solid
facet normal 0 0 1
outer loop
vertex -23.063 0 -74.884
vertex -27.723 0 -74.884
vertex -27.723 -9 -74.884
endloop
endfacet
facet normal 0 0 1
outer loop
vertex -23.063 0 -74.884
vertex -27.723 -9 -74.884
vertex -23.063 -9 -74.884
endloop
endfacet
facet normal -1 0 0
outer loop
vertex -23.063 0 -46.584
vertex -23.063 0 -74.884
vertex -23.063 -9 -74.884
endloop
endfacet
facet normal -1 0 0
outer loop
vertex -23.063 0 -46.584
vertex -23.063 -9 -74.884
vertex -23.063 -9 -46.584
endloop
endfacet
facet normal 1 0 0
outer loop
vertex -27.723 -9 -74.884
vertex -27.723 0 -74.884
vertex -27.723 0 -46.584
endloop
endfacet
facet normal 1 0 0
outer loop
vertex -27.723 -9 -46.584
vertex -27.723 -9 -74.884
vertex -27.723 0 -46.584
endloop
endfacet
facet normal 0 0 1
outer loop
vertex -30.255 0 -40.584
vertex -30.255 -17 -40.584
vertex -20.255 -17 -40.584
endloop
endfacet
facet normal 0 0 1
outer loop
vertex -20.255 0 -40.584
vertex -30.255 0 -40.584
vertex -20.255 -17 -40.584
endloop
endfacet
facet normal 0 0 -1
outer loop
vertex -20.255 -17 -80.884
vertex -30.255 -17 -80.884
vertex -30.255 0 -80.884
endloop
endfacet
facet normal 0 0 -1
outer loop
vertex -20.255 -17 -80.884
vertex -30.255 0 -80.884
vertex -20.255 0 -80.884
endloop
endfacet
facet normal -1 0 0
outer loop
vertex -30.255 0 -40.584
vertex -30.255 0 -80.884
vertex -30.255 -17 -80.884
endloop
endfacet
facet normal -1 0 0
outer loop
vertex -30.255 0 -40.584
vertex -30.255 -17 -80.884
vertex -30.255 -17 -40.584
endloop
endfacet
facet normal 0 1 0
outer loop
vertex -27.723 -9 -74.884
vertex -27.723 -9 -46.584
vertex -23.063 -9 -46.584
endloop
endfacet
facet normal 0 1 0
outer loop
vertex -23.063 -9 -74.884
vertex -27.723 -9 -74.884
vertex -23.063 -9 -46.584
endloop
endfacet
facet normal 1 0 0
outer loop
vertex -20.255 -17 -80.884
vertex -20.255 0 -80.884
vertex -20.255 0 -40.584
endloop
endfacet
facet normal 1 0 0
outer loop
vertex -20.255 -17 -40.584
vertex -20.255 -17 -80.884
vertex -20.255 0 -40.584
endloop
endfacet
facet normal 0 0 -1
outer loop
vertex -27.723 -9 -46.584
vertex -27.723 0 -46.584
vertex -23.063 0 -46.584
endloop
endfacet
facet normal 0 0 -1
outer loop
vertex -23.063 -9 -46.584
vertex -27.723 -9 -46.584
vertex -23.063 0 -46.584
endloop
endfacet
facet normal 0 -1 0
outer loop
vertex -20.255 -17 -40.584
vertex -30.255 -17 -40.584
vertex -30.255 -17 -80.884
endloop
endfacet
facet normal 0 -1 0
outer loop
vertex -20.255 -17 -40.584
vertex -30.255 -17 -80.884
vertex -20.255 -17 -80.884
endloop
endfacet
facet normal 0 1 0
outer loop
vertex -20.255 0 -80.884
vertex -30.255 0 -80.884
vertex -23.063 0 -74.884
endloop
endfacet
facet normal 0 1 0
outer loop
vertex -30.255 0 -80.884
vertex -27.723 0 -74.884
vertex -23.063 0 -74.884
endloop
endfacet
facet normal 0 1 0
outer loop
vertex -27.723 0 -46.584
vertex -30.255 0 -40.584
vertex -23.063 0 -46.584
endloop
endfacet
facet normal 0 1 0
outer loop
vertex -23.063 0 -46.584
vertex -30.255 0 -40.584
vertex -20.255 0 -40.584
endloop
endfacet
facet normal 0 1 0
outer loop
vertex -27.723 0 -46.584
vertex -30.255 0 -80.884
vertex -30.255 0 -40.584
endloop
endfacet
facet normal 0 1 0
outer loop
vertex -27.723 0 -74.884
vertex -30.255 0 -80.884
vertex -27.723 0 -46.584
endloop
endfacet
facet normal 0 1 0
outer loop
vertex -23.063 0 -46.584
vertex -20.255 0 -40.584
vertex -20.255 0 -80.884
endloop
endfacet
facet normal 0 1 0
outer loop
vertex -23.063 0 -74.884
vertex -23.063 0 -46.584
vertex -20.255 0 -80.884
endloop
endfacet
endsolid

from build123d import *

# Parameters (mm, degrees)
F0_W     = 10
F0_H     = 40.3
F0_W_2   = 4.6593984449
F0_H_2   = 28.3
F1_DEPTH = 17
F2_DEPTH = 9


# Not quite as in the source:
# - a feature names something its author has since deleted; it is built from what else it names


with BuildPart() as f1:
    # F0 (on Front) → F1 (new body)
    with BuildSketch(Plane.XZ):
        with Locations((-25.2545091997, -60.7344553381)):
            Rectangle(F0_W, F0_H)
        with Locations((-25.3930282849, -60.7344553381)):
            Rectangle(F0_W_2, F0_H_2, mode=Mode.SUBTRACT)
        with Locations((-25.3930282849, -60.7344553381)):
            Rectangle(F0_W_2, F0_H_2)
    extrude(amount=F1_DEPTH)

    # F0 (on Front) → F2 (cut)
    with BuildSketch(Plane.XZ):
        with Locations((-25.3930282849, -60.7344553381)):
            Rectangle(F0_W_2, F0_H_2)
    extrude(amount=F2_DEPTH, mode=Mode.SUBTRACT)


solid = f1.part
